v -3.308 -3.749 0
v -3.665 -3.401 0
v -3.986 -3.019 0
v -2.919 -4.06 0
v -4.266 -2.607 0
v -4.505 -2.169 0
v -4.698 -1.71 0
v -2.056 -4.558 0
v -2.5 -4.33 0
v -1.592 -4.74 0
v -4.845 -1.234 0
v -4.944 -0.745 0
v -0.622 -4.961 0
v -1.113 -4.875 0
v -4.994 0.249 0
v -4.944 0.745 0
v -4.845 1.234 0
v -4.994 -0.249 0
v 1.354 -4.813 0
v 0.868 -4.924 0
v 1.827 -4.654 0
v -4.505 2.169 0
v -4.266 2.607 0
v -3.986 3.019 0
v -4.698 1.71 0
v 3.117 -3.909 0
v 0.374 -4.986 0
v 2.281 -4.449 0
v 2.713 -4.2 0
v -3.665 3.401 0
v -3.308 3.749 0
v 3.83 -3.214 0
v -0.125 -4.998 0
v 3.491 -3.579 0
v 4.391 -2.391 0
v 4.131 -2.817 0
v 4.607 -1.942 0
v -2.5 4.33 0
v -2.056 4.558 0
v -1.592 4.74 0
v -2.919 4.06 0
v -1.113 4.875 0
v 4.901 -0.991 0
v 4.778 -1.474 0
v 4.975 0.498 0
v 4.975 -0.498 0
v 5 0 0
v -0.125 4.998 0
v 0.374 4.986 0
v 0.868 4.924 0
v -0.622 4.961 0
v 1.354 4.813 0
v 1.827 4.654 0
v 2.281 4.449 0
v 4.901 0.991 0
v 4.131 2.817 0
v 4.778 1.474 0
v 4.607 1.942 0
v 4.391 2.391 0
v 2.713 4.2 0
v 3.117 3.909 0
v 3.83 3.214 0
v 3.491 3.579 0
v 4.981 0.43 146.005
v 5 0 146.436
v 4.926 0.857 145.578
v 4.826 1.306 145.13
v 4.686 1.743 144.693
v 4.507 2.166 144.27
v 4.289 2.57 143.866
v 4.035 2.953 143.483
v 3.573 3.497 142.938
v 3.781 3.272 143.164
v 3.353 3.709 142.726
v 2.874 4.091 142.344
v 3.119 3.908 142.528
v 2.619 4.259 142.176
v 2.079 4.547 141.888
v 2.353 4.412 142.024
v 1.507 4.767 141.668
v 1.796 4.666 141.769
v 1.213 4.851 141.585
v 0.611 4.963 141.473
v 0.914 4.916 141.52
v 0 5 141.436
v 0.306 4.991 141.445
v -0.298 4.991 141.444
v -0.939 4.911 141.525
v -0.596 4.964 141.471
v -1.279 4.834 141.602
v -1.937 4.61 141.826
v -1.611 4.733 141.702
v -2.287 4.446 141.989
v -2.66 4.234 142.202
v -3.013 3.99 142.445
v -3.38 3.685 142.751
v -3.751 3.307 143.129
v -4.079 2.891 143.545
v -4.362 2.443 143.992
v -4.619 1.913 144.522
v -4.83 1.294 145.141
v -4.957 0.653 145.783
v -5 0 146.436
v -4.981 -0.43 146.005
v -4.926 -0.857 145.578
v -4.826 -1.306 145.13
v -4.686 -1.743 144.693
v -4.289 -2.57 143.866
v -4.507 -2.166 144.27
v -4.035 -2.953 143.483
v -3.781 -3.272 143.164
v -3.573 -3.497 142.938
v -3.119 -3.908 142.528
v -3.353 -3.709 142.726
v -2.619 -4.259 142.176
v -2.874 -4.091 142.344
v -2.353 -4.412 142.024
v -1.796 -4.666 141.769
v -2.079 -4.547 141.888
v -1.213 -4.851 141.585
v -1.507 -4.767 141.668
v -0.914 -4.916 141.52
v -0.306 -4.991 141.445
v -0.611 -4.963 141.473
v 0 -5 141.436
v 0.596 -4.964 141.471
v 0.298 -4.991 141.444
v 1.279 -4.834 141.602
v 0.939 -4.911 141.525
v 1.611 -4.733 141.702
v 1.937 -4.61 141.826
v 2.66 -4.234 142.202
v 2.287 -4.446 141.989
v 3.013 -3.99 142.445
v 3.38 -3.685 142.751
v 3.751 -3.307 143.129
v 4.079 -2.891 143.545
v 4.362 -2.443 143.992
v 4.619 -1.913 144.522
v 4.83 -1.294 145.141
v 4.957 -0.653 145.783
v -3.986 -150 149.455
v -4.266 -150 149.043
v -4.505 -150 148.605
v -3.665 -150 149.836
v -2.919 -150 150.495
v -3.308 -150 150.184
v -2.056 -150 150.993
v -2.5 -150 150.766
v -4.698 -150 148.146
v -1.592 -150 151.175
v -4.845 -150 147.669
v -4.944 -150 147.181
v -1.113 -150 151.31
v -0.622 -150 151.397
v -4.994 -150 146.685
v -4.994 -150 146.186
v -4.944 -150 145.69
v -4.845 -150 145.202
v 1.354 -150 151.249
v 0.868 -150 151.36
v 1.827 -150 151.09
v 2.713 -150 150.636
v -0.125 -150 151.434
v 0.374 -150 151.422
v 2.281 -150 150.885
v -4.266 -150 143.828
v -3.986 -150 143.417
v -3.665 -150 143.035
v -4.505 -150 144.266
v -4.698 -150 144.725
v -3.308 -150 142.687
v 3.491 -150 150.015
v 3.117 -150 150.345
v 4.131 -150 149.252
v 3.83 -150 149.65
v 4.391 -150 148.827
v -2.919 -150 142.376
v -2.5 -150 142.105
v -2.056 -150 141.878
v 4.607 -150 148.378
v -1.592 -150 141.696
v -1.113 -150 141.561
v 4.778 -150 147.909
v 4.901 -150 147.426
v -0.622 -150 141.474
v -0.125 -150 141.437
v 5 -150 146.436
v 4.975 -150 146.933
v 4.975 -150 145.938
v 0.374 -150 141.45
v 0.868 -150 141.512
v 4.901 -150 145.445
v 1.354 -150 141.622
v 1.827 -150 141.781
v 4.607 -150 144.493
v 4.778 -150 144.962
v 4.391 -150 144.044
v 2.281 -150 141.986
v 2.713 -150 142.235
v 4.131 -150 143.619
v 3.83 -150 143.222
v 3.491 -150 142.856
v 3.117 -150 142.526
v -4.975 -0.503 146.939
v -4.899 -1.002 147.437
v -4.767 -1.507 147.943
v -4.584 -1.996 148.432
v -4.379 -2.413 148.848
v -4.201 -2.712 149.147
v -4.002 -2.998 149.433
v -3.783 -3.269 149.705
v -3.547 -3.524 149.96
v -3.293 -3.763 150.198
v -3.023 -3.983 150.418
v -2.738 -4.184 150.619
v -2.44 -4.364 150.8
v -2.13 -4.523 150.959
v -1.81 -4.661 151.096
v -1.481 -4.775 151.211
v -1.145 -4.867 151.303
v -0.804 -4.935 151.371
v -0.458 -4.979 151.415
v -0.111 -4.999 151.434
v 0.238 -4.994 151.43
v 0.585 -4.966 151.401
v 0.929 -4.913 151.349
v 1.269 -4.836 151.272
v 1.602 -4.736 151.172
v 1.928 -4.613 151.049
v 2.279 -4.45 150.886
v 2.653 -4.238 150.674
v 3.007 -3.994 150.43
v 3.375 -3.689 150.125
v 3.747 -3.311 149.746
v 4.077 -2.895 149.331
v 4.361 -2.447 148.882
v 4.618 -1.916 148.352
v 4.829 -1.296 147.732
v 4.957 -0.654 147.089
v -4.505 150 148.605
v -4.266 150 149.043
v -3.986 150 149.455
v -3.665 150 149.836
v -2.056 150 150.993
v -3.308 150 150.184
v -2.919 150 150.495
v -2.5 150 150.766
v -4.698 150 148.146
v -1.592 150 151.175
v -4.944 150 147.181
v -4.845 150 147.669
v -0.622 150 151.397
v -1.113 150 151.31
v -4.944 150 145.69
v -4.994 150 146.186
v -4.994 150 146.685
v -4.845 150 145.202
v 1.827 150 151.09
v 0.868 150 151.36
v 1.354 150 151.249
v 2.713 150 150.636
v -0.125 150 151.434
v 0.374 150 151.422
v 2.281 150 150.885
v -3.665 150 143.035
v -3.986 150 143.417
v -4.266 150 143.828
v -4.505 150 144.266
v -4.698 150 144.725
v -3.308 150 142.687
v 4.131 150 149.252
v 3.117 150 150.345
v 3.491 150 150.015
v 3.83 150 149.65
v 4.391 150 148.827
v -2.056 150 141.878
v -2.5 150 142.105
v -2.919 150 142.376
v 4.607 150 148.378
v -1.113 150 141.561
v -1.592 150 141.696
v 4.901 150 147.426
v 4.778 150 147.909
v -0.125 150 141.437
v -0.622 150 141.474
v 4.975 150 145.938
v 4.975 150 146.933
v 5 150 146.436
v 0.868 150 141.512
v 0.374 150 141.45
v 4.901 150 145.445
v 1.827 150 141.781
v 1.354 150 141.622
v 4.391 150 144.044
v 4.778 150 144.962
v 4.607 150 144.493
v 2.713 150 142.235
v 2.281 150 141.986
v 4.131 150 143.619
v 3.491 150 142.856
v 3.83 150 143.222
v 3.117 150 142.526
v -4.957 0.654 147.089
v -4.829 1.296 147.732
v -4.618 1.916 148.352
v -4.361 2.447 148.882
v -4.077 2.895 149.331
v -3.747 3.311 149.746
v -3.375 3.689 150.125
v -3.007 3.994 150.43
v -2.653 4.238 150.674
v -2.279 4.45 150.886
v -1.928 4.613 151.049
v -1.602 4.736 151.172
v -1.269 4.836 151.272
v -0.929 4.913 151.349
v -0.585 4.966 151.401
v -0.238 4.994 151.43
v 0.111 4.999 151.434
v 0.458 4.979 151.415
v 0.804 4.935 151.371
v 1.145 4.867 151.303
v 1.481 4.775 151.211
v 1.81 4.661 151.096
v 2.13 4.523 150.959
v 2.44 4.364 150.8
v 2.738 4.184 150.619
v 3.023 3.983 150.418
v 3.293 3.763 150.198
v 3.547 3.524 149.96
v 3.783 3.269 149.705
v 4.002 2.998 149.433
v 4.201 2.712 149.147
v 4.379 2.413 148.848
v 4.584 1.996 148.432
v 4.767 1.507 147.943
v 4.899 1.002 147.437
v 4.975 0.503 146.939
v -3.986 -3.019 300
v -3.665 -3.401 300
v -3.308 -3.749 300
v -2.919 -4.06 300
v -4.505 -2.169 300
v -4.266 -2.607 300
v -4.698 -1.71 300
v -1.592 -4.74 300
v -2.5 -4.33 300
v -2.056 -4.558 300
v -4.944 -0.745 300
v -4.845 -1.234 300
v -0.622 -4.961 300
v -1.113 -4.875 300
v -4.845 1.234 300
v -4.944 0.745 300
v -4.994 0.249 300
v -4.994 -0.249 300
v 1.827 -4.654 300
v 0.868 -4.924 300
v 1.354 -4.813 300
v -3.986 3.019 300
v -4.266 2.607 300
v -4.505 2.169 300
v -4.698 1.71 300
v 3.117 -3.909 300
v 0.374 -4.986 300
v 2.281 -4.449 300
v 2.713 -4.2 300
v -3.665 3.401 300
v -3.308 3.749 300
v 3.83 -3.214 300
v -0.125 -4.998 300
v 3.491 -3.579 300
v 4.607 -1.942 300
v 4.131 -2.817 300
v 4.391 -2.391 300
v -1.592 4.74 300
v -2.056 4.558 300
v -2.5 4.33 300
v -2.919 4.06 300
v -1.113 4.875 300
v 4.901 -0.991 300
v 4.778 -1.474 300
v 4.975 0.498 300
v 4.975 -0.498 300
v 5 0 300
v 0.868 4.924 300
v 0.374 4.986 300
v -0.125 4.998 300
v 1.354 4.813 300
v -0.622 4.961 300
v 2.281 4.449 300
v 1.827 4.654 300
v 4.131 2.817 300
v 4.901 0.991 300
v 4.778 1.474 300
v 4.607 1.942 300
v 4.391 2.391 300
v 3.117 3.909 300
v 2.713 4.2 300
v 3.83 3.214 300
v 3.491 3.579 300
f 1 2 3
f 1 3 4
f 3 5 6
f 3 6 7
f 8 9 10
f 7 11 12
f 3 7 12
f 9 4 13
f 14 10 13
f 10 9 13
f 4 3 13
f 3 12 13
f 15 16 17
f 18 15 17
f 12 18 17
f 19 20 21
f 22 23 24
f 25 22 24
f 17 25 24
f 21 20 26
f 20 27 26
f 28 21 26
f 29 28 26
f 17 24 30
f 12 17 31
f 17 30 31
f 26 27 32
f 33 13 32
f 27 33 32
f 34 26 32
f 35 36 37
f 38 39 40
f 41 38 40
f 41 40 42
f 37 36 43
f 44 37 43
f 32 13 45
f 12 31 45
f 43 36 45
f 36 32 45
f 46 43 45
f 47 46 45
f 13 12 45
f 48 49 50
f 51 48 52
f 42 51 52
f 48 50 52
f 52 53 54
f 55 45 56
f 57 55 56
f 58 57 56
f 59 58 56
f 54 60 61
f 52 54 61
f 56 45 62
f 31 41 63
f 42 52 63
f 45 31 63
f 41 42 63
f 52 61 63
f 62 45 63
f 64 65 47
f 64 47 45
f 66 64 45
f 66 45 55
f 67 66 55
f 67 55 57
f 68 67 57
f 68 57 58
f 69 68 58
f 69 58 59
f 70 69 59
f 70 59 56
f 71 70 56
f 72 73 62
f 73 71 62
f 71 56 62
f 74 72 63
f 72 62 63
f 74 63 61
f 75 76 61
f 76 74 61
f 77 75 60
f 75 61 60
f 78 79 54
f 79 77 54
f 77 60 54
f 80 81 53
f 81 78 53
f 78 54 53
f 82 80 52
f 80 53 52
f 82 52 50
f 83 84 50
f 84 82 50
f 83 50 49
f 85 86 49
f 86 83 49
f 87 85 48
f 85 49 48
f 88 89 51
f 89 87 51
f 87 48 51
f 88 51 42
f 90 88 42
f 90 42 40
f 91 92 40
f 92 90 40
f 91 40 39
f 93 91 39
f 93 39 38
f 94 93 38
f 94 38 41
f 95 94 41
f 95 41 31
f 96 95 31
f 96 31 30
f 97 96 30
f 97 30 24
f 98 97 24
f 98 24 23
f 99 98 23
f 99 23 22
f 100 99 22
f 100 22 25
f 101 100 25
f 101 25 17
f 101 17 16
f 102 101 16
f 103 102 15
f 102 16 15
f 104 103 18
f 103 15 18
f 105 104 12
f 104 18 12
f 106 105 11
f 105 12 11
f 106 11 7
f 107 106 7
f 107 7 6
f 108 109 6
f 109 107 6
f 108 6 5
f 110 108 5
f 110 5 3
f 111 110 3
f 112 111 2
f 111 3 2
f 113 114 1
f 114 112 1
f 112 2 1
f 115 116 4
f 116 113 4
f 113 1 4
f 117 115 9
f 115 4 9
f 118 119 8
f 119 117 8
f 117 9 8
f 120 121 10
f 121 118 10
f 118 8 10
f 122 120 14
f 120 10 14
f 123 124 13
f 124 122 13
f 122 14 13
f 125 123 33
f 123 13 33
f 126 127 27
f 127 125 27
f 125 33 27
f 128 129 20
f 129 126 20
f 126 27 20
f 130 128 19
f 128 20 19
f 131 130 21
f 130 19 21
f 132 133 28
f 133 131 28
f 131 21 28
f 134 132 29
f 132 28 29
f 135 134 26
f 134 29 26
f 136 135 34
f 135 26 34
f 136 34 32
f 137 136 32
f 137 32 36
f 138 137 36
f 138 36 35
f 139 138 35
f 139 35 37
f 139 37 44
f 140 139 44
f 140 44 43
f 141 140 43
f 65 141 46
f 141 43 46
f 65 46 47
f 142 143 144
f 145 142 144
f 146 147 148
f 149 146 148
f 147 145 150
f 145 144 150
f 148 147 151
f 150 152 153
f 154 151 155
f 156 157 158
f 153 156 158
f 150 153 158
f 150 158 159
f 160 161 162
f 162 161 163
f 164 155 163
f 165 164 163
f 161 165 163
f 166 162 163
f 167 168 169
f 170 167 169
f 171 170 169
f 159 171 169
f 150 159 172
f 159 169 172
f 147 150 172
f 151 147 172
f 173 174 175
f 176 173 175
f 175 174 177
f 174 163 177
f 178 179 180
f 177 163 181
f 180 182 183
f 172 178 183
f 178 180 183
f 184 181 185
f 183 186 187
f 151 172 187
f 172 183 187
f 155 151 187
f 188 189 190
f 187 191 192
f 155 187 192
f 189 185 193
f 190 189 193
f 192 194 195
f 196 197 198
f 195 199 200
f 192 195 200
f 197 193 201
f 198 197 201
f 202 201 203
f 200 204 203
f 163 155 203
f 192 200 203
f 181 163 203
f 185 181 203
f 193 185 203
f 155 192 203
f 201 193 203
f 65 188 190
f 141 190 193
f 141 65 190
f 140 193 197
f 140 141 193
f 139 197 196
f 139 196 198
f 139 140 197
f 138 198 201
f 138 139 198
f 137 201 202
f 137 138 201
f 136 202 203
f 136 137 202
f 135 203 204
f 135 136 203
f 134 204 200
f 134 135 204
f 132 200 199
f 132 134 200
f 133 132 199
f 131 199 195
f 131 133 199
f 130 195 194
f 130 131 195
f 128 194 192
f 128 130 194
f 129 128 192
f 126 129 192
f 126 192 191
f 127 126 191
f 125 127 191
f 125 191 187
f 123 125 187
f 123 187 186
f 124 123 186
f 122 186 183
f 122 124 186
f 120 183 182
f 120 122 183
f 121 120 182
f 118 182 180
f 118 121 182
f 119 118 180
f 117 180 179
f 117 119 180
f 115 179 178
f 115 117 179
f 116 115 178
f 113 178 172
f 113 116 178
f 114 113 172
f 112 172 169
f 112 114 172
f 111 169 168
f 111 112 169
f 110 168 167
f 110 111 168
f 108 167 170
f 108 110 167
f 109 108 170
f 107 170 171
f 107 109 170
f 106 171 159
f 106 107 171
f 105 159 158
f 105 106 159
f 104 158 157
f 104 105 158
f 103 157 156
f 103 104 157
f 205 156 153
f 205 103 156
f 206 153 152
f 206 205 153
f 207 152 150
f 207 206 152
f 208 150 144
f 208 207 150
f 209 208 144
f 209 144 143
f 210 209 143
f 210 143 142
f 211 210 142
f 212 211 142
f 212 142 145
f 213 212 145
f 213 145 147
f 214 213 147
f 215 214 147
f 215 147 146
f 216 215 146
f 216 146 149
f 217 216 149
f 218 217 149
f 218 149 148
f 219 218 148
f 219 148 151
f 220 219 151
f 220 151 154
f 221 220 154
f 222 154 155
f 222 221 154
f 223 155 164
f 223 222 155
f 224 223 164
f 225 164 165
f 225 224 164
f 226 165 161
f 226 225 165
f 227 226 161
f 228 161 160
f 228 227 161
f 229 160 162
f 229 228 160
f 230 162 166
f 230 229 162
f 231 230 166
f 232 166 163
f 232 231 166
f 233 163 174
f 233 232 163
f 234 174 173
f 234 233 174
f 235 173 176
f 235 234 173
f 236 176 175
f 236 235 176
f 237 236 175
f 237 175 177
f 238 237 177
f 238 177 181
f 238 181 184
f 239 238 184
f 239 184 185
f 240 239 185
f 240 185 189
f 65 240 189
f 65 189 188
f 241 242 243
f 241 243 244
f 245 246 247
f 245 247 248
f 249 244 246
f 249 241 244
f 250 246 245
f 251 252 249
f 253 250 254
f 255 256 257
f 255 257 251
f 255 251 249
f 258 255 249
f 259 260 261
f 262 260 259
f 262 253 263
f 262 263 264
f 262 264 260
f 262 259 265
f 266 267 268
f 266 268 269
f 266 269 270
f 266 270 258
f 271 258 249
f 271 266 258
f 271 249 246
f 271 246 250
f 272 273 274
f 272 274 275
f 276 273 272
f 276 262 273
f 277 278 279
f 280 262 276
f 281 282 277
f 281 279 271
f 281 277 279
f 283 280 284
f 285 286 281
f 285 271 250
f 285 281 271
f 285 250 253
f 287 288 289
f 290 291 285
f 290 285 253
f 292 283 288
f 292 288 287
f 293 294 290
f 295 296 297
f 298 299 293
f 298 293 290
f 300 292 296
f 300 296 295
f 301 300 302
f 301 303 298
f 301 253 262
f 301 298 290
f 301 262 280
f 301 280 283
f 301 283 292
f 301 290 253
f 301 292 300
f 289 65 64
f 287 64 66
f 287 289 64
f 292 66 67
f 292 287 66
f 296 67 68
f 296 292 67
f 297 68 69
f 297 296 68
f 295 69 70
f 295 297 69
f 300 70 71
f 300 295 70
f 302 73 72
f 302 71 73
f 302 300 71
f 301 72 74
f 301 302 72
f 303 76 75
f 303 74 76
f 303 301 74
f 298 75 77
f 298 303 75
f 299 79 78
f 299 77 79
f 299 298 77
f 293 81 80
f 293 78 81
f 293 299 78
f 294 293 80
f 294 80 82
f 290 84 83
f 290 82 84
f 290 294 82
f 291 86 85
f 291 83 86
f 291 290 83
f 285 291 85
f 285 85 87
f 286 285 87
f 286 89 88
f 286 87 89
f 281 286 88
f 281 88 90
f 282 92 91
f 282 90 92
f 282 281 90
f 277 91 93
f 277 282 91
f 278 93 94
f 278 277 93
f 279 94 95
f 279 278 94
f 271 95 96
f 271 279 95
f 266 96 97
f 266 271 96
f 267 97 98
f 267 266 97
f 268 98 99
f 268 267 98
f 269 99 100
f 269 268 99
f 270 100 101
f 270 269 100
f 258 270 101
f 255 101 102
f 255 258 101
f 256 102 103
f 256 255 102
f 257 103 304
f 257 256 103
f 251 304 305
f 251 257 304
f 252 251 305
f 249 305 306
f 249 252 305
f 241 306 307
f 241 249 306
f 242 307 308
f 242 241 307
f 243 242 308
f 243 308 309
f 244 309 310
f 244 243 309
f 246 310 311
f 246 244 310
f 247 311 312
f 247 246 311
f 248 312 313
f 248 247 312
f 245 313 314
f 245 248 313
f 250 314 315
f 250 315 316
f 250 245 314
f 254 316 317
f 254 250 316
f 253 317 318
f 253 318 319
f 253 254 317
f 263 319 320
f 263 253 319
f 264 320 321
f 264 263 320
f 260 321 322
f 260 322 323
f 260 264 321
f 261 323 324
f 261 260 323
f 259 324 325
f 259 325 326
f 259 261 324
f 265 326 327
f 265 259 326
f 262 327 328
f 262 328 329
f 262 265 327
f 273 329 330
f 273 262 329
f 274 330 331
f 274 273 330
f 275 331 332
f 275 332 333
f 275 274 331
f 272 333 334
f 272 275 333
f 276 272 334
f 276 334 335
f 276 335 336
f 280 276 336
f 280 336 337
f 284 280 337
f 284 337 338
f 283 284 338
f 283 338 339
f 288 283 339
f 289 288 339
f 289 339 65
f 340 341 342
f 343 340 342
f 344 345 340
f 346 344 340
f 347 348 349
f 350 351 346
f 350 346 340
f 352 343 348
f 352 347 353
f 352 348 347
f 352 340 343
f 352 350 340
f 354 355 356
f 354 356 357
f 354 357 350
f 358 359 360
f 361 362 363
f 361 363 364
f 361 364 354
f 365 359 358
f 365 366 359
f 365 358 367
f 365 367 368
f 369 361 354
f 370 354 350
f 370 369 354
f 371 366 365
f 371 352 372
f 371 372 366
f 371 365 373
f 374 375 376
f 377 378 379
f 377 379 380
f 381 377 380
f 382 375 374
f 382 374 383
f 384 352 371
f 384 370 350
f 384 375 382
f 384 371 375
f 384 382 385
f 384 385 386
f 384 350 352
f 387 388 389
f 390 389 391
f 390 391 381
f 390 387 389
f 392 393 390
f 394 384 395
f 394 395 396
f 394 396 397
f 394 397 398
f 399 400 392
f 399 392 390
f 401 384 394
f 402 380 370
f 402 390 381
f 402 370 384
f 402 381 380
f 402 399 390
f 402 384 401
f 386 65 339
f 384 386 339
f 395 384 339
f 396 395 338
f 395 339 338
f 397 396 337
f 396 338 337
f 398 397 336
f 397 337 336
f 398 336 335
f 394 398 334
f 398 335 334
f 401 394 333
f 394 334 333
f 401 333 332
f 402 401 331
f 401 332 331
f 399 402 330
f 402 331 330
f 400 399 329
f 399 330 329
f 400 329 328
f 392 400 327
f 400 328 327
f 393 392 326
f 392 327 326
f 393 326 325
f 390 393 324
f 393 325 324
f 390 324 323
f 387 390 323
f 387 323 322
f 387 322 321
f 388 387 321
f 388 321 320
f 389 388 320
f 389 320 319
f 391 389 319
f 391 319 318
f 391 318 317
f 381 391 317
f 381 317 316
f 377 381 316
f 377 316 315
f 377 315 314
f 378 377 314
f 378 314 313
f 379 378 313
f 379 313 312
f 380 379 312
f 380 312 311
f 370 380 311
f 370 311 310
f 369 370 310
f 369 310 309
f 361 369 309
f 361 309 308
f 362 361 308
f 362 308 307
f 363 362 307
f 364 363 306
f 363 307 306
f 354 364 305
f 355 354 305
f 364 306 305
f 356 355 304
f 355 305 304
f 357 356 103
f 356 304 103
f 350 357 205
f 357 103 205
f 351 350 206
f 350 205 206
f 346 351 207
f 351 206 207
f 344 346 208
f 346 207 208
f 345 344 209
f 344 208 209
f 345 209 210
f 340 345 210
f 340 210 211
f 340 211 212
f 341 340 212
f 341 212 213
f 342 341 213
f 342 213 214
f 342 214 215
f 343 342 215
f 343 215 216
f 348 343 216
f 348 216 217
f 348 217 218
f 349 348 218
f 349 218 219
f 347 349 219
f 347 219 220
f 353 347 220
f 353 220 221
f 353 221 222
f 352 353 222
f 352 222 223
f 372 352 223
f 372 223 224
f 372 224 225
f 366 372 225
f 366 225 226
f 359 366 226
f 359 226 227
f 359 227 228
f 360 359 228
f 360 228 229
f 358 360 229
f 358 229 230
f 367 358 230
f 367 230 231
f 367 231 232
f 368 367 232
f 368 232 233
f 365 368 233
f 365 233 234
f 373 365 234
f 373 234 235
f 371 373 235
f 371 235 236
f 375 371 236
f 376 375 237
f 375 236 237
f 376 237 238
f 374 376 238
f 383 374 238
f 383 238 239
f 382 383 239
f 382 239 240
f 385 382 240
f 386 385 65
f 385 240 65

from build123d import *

# Parameters (mm, degrees)
SKETCH1_R           = 5
BOSS_EXTRUDE1_DEPTH = 300
SKETCH2_R           = 5
BOSS_EXTRUDE2_DEPTH = 150


with BuildPart() as part:
    # Sketch1 → Boss-Extrude1 (new body)
    with BuildSketch(Plane.XY):
        Circle(SKETCH1_R)
    extrude(amount=BOSS_EXTRUDE1_DEPTH)

    # Sketch2 → Boss-Extrude2 (add, symmetric)
    with BuildSketch(Plane(origin=(0, 0, 0), x_dir=(1, 0, 0), z_dir=(0, 1, 0))):
        with Locations((0, -146.435568709)):
            Circle(SKETCH2_R)
    extrude(amount=BOSS_EXTRUDE2_DEPTH, both=True)


solid = part.part
